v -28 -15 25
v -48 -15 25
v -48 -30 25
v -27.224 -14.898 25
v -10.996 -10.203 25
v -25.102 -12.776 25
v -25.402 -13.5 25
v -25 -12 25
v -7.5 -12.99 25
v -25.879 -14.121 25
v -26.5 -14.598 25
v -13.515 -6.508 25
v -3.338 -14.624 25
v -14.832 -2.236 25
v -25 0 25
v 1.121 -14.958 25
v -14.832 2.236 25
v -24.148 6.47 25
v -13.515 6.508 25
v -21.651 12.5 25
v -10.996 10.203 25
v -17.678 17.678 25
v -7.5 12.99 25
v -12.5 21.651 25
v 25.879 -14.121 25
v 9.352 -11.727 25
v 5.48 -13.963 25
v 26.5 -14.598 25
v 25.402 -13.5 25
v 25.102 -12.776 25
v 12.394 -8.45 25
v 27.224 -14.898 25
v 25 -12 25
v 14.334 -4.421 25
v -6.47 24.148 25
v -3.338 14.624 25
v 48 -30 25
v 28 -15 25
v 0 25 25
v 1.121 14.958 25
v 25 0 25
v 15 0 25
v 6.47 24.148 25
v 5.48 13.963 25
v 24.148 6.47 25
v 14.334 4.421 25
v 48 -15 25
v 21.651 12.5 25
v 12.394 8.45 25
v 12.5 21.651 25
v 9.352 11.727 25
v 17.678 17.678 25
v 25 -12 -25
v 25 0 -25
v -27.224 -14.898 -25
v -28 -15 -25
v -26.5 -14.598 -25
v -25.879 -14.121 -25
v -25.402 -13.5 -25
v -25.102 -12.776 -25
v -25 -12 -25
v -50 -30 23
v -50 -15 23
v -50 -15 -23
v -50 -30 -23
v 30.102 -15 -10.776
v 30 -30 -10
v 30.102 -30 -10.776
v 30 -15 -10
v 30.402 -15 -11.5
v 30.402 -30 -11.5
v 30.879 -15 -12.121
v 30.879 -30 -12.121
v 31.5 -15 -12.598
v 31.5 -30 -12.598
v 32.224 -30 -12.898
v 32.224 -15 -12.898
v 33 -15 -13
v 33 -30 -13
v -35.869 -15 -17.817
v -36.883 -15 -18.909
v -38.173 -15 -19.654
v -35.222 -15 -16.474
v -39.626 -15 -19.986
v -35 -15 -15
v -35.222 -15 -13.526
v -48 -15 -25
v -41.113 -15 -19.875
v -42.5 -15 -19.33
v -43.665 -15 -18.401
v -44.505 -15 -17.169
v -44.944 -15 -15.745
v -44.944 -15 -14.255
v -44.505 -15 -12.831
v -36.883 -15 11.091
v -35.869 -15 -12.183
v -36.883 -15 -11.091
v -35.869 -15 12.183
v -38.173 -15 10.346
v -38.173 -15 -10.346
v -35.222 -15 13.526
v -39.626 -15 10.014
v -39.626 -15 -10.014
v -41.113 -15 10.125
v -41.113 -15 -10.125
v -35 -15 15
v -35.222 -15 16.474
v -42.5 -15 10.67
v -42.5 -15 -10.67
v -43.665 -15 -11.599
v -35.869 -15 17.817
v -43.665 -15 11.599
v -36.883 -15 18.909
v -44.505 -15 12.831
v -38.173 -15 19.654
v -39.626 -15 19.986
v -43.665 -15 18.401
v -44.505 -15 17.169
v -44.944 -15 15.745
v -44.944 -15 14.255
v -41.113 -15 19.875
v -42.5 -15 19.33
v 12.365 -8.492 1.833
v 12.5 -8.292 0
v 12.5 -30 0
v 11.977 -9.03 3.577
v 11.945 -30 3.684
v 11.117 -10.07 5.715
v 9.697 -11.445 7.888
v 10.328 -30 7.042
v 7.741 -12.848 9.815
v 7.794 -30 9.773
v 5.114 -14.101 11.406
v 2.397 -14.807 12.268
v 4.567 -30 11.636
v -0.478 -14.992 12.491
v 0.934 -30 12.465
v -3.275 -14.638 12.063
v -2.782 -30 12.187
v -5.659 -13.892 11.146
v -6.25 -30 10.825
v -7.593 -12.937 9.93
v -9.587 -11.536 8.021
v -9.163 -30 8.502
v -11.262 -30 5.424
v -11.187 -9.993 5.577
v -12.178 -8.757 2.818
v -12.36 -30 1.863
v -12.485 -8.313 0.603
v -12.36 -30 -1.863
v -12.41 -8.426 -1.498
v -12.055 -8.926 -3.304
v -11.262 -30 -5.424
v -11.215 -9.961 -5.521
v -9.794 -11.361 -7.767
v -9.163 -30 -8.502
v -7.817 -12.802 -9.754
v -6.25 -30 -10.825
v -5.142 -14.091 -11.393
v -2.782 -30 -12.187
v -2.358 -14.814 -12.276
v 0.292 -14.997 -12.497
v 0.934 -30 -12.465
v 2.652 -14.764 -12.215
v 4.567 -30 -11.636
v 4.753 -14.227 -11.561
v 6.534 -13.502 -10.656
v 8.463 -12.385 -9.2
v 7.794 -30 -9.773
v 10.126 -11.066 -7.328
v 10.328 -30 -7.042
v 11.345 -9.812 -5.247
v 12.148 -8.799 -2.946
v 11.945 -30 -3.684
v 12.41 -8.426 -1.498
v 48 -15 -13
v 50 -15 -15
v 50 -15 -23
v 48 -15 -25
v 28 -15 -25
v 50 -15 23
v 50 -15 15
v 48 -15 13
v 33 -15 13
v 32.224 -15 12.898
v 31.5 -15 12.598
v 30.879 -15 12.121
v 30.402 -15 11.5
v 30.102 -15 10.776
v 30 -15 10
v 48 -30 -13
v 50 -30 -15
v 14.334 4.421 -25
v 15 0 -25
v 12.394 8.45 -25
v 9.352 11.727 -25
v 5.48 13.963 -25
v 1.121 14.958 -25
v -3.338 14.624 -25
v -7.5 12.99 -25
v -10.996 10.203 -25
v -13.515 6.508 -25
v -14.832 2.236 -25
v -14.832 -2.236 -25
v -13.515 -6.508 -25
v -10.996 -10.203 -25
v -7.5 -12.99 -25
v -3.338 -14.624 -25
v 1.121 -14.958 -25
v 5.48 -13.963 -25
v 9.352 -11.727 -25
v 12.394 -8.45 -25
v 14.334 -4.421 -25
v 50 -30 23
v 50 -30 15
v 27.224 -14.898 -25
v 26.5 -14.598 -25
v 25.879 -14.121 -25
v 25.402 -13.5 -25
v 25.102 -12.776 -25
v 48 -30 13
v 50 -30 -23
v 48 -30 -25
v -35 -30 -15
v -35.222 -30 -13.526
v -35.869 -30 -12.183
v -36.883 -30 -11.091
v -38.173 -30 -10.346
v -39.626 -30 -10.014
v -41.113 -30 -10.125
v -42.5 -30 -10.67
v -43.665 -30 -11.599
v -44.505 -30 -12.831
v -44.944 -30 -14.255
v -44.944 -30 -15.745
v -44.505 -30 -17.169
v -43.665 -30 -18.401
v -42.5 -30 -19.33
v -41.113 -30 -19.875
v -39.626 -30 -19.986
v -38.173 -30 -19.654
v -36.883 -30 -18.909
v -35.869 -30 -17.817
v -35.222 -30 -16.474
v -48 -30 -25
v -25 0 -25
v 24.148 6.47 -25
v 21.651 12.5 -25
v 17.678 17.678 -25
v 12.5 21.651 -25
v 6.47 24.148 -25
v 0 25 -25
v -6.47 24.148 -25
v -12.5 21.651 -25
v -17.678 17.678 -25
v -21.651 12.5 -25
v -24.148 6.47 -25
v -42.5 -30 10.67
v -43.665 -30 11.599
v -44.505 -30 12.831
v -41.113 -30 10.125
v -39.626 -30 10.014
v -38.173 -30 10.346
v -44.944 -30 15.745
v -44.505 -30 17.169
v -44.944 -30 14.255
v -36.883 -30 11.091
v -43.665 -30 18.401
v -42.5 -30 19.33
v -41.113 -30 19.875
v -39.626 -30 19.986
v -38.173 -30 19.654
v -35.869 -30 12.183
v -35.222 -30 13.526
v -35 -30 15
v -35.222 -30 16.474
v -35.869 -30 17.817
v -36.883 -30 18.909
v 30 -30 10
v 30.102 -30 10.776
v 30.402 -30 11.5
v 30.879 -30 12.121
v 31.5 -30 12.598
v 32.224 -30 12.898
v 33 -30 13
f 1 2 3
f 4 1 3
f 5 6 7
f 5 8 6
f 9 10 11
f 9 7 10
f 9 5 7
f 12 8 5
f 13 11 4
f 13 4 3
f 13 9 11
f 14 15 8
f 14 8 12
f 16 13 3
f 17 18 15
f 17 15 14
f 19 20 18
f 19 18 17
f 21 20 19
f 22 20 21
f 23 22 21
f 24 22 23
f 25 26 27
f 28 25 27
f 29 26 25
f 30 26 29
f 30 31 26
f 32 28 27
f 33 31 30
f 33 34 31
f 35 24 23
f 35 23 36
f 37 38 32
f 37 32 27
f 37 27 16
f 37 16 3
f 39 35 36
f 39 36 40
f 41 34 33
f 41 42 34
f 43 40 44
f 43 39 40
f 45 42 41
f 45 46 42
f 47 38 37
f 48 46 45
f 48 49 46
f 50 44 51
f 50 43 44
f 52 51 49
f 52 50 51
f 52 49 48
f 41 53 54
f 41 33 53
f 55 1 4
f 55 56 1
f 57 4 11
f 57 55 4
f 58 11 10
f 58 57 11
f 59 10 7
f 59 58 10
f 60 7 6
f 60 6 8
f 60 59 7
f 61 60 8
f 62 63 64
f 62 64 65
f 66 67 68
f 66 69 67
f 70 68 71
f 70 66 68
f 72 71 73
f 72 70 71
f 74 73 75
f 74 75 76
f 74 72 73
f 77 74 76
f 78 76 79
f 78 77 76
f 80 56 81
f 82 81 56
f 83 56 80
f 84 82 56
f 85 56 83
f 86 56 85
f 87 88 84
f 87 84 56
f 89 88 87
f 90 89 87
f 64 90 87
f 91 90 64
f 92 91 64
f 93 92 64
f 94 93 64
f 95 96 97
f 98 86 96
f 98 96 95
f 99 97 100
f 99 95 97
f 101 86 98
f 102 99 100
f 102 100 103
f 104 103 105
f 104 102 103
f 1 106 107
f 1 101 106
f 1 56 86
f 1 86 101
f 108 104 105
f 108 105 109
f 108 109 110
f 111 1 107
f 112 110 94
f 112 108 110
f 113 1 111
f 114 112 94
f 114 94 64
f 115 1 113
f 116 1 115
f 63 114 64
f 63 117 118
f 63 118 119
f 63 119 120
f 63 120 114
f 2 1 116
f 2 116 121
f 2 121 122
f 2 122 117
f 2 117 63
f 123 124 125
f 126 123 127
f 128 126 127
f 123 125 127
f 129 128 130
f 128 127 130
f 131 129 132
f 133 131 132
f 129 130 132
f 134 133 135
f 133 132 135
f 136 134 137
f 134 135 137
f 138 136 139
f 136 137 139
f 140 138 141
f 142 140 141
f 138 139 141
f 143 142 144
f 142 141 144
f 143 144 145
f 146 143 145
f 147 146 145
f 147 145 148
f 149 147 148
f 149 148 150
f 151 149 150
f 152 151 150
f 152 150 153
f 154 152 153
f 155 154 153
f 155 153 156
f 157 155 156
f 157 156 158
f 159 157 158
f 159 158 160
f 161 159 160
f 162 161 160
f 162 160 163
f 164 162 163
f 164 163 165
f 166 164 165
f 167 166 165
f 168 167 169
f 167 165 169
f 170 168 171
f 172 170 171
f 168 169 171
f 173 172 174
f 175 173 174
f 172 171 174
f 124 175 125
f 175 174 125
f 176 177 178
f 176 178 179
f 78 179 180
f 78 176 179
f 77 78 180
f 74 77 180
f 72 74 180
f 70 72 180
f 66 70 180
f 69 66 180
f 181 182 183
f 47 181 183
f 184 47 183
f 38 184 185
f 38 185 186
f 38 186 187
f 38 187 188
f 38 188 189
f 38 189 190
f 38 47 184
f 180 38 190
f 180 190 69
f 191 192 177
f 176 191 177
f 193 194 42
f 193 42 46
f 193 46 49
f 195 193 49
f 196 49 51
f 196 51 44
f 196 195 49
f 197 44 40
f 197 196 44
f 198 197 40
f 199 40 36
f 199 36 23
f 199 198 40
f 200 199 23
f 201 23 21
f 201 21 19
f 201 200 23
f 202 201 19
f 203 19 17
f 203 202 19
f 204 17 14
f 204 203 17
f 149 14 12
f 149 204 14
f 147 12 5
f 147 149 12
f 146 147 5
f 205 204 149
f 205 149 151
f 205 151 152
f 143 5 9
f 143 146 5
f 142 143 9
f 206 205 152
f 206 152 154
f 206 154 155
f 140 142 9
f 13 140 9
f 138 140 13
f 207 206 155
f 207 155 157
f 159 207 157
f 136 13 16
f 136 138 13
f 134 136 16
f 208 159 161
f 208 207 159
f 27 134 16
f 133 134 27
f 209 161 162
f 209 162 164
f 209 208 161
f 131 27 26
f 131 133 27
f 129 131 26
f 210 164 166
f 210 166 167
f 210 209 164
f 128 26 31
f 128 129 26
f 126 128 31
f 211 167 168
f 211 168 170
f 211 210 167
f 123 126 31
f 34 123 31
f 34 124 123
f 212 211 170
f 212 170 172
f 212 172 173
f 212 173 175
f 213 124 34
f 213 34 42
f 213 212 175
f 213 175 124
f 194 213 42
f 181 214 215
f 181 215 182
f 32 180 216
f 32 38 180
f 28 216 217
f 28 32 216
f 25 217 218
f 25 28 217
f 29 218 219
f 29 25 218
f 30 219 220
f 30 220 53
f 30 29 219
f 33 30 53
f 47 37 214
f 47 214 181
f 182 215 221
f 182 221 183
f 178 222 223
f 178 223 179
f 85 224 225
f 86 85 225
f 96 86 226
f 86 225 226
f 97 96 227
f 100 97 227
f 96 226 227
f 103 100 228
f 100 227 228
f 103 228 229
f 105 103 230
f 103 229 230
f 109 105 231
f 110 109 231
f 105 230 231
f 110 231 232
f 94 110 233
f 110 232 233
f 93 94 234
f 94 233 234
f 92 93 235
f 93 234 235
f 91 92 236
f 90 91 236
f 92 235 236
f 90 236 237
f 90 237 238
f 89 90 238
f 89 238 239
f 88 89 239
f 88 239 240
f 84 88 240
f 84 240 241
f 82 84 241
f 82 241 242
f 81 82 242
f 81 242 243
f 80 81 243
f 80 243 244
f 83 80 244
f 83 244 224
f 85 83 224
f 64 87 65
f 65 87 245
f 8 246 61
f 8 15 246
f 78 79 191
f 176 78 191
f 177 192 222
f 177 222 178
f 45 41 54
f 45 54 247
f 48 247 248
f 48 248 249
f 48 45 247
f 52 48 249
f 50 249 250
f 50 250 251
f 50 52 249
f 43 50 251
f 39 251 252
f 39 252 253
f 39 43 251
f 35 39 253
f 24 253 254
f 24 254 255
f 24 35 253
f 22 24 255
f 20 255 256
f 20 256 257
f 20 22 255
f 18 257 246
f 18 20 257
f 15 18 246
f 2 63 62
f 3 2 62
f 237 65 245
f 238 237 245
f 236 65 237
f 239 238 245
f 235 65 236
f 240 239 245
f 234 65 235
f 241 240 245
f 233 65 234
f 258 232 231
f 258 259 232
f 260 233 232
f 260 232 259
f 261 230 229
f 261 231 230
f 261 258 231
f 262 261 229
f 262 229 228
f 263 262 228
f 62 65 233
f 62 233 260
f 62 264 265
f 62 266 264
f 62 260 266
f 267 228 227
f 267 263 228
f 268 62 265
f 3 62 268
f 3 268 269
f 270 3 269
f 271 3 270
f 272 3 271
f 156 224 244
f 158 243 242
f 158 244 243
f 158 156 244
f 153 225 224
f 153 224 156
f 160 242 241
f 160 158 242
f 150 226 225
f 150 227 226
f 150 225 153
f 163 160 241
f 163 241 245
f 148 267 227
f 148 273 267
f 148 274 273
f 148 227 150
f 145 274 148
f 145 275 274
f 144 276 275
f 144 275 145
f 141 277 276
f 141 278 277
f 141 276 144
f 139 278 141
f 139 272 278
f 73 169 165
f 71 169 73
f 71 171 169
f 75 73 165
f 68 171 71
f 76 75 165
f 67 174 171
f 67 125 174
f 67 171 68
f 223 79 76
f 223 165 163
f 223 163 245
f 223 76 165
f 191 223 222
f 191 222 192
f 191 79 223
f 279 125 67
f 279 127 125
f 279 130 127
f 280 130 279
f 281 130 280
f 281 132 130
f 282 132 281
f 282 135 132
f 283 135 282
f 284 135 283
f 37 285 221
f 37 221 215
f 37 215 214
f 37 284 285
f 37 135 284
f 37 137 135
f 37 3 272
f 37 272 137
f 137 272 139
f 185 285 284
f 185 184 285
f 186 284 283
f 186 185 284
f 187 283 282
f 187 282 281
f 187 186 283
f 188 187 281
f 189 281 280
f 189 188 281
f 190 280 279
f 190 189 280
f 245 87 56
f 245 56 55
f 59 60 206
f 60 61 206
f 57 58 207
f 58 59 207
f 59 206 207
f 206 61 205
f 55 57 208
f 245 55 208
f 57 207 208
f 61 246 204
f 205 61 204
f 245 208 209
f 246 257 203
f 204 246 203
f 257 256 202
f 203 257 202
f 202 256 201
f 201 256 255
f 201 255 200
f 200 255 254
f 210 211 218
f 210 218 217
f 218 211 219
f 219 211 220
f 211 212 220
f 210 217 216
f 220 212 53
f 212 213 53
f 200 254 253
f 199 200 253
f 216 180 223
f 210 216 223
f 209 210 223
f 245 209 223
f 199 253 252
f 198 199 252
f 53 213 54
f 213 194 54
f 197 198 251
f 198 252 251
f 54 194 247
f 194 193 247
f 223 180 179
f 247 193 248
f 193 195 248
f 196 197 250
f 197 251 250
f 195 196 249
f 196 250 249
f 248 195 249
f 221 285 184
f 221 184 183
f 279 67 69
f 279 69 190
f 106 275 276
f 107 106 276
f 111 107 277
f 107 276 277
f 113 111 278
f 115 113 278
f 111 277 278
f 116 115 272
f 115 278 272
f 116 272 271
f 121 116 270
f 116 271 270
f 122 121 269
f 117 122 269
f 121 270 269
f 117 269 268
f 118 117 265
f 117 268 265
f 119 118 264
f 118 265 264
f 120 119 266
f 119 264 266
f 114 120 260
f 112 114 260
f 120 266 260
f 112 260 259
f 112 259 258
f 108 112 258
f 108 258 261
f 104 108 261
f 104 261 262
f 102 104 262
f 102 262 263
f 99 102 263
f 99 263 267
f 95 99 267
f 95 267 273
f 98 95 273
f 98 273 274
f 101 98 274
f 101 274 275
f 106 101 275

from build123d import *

# Parameters (mm, degrees)
SKETCH1_R           = 15
BOSS_EXTRUDE2_DEPTH = 25
CUT_EXTRUDE1_REACH  = 57
SKETCH3_R           = 12.5
SKETCH3_R_2         = 5
CUT_EXTRUDE2_REACH  = 57
SKETCH5_W           = 20
SKETCH5_H           = 26
FILLET2_R           = 3
CHAMFER1_SIZE       = 2


with BuildPart() as part:
    # Sketch1 → Boss-Extrude2 (new body, symmetric)
    with BuildSketch(Plane.XY):
        with BuildLine():
            Line((-50, -30), (50, -30))
            Line((50, -30), (50, -15))
            Line((50, -15), (25, -15))
            Line((25, -15), (25, 0))
            ThreePointArc((25, 0), (0, 25), (-25, 0))
            Line((-25, 0), (-25, -15))
            Line((-25, -15), (-50, -15))
            Line((-50, -15), (-50, -30))
        make_face()
        Circle(SKETCH1_R, mode=Mode.SUBTRACT)
    extrude(amount=BOSS_EXTRUDE2_DEPTH, both=True)

    # Sketch3 → Cut-Extrude1 (cut, up to next)
    with BuildSketch(Plane.XZ.offset(30), mode=Mode.PRIVATE) as cut_extrude1_sk1:
        Circle(SKETCH3_R)
    cut_extrude1_tool1 = extrude(cut_extrude1_sk1.sketch, amount=-CUT_EXTRUDE1_REACH, mode=Mode.PRIVATE) & part.part
    add(cut_extrude1_tool1.solids().sort_by_distance((0, -30, 0))[0], mode=Mode.SUBTRACT)
    # Sketch3 → Cut-Extrude1 (cut, up to next)
    with BuildSketch(Plane.XZ.offset(30), mode=Mode.PRIVATE) as cut_extrude1_sk2:
        with Locations((-40, 15)):
            Circle(SKETCH3_R_2)
    cut_extrude1_tool2 = extrude(cut_extrude1_sk2.sketch, amount=-CUT_EXTRUDE1_REACH, mode=Mode.PRIVATE) & part.part
    add(cut_extrude1_tool2.solids().sort_by_distance((-40, -30, 15))[0], mode=Mode.SUBTRACT)
    # Sketch3 → Cut-Extrude1 (cut, up to next)
    with BuildSketch(Plane.XZ.offset(30), mode=Mode.PRIVATE) as cut_extrude1_sk3:
        with Locations((-40, -15)):
            Circle(SKETCH3_R_2)
    cut_extrude1_tool3 = extrude(cut_extrude1_sk3.sketch, amount=-CUT_EXTRUDE1_REACH, mode=Mode.PRIVATE) & part.part
    add(cut_extrude1_tool3.solids().sort_by_distance((-40, -30, -15))[0], mode=Mode.SUBTRACT)

    # Sketch5 → Cut-Extrude2 (cut, up to next)
    with BuildSketch(Plane.XZ.offset(30), mode=Mode.PRIVATE) as cut_extrude2_sk1:
        with Locations((40, 0)):
            Rectangle(SKETCH5_W, SKETCH5_H)
    cut_extrude2_tool1 = extrude(cut_extrude2_sk1.sketch, amount=-CUT_EXTRUDE2_REACH, mode=Mode.PRIVATE) & part.part
    add(cut_extrude2_tool1.solids().sort_by_distance((40, -30, 0))[0], mode=Mode.SUBTRACT)

    # Fillet2
    fillet2_edges = [part.edges().sort_by_distance(p)[0] for p in [
        (-25, -15, 0),
        (25, -15, 0),
        (30, -22.5, -13),
        (30, -22.5, 13),
    ]]
    fillet(fillet2_edges, radius=FILLET2_R)

    # Chamfer1
    chamfer1_edges = [part.edges().sort_by_distance(p)[0] for p in [
        (50, -22.5, -25),
        (-50, -22.5, -25),
        (50, -22.5, 25),
        (50, -22.5, 13),
        (50, -22.5, -13),
        (-50, -22.5, 25),
    ]]
    chamfer(chamfer1_edges, length=CHAMFER1_SIZE)


solid = part.part
